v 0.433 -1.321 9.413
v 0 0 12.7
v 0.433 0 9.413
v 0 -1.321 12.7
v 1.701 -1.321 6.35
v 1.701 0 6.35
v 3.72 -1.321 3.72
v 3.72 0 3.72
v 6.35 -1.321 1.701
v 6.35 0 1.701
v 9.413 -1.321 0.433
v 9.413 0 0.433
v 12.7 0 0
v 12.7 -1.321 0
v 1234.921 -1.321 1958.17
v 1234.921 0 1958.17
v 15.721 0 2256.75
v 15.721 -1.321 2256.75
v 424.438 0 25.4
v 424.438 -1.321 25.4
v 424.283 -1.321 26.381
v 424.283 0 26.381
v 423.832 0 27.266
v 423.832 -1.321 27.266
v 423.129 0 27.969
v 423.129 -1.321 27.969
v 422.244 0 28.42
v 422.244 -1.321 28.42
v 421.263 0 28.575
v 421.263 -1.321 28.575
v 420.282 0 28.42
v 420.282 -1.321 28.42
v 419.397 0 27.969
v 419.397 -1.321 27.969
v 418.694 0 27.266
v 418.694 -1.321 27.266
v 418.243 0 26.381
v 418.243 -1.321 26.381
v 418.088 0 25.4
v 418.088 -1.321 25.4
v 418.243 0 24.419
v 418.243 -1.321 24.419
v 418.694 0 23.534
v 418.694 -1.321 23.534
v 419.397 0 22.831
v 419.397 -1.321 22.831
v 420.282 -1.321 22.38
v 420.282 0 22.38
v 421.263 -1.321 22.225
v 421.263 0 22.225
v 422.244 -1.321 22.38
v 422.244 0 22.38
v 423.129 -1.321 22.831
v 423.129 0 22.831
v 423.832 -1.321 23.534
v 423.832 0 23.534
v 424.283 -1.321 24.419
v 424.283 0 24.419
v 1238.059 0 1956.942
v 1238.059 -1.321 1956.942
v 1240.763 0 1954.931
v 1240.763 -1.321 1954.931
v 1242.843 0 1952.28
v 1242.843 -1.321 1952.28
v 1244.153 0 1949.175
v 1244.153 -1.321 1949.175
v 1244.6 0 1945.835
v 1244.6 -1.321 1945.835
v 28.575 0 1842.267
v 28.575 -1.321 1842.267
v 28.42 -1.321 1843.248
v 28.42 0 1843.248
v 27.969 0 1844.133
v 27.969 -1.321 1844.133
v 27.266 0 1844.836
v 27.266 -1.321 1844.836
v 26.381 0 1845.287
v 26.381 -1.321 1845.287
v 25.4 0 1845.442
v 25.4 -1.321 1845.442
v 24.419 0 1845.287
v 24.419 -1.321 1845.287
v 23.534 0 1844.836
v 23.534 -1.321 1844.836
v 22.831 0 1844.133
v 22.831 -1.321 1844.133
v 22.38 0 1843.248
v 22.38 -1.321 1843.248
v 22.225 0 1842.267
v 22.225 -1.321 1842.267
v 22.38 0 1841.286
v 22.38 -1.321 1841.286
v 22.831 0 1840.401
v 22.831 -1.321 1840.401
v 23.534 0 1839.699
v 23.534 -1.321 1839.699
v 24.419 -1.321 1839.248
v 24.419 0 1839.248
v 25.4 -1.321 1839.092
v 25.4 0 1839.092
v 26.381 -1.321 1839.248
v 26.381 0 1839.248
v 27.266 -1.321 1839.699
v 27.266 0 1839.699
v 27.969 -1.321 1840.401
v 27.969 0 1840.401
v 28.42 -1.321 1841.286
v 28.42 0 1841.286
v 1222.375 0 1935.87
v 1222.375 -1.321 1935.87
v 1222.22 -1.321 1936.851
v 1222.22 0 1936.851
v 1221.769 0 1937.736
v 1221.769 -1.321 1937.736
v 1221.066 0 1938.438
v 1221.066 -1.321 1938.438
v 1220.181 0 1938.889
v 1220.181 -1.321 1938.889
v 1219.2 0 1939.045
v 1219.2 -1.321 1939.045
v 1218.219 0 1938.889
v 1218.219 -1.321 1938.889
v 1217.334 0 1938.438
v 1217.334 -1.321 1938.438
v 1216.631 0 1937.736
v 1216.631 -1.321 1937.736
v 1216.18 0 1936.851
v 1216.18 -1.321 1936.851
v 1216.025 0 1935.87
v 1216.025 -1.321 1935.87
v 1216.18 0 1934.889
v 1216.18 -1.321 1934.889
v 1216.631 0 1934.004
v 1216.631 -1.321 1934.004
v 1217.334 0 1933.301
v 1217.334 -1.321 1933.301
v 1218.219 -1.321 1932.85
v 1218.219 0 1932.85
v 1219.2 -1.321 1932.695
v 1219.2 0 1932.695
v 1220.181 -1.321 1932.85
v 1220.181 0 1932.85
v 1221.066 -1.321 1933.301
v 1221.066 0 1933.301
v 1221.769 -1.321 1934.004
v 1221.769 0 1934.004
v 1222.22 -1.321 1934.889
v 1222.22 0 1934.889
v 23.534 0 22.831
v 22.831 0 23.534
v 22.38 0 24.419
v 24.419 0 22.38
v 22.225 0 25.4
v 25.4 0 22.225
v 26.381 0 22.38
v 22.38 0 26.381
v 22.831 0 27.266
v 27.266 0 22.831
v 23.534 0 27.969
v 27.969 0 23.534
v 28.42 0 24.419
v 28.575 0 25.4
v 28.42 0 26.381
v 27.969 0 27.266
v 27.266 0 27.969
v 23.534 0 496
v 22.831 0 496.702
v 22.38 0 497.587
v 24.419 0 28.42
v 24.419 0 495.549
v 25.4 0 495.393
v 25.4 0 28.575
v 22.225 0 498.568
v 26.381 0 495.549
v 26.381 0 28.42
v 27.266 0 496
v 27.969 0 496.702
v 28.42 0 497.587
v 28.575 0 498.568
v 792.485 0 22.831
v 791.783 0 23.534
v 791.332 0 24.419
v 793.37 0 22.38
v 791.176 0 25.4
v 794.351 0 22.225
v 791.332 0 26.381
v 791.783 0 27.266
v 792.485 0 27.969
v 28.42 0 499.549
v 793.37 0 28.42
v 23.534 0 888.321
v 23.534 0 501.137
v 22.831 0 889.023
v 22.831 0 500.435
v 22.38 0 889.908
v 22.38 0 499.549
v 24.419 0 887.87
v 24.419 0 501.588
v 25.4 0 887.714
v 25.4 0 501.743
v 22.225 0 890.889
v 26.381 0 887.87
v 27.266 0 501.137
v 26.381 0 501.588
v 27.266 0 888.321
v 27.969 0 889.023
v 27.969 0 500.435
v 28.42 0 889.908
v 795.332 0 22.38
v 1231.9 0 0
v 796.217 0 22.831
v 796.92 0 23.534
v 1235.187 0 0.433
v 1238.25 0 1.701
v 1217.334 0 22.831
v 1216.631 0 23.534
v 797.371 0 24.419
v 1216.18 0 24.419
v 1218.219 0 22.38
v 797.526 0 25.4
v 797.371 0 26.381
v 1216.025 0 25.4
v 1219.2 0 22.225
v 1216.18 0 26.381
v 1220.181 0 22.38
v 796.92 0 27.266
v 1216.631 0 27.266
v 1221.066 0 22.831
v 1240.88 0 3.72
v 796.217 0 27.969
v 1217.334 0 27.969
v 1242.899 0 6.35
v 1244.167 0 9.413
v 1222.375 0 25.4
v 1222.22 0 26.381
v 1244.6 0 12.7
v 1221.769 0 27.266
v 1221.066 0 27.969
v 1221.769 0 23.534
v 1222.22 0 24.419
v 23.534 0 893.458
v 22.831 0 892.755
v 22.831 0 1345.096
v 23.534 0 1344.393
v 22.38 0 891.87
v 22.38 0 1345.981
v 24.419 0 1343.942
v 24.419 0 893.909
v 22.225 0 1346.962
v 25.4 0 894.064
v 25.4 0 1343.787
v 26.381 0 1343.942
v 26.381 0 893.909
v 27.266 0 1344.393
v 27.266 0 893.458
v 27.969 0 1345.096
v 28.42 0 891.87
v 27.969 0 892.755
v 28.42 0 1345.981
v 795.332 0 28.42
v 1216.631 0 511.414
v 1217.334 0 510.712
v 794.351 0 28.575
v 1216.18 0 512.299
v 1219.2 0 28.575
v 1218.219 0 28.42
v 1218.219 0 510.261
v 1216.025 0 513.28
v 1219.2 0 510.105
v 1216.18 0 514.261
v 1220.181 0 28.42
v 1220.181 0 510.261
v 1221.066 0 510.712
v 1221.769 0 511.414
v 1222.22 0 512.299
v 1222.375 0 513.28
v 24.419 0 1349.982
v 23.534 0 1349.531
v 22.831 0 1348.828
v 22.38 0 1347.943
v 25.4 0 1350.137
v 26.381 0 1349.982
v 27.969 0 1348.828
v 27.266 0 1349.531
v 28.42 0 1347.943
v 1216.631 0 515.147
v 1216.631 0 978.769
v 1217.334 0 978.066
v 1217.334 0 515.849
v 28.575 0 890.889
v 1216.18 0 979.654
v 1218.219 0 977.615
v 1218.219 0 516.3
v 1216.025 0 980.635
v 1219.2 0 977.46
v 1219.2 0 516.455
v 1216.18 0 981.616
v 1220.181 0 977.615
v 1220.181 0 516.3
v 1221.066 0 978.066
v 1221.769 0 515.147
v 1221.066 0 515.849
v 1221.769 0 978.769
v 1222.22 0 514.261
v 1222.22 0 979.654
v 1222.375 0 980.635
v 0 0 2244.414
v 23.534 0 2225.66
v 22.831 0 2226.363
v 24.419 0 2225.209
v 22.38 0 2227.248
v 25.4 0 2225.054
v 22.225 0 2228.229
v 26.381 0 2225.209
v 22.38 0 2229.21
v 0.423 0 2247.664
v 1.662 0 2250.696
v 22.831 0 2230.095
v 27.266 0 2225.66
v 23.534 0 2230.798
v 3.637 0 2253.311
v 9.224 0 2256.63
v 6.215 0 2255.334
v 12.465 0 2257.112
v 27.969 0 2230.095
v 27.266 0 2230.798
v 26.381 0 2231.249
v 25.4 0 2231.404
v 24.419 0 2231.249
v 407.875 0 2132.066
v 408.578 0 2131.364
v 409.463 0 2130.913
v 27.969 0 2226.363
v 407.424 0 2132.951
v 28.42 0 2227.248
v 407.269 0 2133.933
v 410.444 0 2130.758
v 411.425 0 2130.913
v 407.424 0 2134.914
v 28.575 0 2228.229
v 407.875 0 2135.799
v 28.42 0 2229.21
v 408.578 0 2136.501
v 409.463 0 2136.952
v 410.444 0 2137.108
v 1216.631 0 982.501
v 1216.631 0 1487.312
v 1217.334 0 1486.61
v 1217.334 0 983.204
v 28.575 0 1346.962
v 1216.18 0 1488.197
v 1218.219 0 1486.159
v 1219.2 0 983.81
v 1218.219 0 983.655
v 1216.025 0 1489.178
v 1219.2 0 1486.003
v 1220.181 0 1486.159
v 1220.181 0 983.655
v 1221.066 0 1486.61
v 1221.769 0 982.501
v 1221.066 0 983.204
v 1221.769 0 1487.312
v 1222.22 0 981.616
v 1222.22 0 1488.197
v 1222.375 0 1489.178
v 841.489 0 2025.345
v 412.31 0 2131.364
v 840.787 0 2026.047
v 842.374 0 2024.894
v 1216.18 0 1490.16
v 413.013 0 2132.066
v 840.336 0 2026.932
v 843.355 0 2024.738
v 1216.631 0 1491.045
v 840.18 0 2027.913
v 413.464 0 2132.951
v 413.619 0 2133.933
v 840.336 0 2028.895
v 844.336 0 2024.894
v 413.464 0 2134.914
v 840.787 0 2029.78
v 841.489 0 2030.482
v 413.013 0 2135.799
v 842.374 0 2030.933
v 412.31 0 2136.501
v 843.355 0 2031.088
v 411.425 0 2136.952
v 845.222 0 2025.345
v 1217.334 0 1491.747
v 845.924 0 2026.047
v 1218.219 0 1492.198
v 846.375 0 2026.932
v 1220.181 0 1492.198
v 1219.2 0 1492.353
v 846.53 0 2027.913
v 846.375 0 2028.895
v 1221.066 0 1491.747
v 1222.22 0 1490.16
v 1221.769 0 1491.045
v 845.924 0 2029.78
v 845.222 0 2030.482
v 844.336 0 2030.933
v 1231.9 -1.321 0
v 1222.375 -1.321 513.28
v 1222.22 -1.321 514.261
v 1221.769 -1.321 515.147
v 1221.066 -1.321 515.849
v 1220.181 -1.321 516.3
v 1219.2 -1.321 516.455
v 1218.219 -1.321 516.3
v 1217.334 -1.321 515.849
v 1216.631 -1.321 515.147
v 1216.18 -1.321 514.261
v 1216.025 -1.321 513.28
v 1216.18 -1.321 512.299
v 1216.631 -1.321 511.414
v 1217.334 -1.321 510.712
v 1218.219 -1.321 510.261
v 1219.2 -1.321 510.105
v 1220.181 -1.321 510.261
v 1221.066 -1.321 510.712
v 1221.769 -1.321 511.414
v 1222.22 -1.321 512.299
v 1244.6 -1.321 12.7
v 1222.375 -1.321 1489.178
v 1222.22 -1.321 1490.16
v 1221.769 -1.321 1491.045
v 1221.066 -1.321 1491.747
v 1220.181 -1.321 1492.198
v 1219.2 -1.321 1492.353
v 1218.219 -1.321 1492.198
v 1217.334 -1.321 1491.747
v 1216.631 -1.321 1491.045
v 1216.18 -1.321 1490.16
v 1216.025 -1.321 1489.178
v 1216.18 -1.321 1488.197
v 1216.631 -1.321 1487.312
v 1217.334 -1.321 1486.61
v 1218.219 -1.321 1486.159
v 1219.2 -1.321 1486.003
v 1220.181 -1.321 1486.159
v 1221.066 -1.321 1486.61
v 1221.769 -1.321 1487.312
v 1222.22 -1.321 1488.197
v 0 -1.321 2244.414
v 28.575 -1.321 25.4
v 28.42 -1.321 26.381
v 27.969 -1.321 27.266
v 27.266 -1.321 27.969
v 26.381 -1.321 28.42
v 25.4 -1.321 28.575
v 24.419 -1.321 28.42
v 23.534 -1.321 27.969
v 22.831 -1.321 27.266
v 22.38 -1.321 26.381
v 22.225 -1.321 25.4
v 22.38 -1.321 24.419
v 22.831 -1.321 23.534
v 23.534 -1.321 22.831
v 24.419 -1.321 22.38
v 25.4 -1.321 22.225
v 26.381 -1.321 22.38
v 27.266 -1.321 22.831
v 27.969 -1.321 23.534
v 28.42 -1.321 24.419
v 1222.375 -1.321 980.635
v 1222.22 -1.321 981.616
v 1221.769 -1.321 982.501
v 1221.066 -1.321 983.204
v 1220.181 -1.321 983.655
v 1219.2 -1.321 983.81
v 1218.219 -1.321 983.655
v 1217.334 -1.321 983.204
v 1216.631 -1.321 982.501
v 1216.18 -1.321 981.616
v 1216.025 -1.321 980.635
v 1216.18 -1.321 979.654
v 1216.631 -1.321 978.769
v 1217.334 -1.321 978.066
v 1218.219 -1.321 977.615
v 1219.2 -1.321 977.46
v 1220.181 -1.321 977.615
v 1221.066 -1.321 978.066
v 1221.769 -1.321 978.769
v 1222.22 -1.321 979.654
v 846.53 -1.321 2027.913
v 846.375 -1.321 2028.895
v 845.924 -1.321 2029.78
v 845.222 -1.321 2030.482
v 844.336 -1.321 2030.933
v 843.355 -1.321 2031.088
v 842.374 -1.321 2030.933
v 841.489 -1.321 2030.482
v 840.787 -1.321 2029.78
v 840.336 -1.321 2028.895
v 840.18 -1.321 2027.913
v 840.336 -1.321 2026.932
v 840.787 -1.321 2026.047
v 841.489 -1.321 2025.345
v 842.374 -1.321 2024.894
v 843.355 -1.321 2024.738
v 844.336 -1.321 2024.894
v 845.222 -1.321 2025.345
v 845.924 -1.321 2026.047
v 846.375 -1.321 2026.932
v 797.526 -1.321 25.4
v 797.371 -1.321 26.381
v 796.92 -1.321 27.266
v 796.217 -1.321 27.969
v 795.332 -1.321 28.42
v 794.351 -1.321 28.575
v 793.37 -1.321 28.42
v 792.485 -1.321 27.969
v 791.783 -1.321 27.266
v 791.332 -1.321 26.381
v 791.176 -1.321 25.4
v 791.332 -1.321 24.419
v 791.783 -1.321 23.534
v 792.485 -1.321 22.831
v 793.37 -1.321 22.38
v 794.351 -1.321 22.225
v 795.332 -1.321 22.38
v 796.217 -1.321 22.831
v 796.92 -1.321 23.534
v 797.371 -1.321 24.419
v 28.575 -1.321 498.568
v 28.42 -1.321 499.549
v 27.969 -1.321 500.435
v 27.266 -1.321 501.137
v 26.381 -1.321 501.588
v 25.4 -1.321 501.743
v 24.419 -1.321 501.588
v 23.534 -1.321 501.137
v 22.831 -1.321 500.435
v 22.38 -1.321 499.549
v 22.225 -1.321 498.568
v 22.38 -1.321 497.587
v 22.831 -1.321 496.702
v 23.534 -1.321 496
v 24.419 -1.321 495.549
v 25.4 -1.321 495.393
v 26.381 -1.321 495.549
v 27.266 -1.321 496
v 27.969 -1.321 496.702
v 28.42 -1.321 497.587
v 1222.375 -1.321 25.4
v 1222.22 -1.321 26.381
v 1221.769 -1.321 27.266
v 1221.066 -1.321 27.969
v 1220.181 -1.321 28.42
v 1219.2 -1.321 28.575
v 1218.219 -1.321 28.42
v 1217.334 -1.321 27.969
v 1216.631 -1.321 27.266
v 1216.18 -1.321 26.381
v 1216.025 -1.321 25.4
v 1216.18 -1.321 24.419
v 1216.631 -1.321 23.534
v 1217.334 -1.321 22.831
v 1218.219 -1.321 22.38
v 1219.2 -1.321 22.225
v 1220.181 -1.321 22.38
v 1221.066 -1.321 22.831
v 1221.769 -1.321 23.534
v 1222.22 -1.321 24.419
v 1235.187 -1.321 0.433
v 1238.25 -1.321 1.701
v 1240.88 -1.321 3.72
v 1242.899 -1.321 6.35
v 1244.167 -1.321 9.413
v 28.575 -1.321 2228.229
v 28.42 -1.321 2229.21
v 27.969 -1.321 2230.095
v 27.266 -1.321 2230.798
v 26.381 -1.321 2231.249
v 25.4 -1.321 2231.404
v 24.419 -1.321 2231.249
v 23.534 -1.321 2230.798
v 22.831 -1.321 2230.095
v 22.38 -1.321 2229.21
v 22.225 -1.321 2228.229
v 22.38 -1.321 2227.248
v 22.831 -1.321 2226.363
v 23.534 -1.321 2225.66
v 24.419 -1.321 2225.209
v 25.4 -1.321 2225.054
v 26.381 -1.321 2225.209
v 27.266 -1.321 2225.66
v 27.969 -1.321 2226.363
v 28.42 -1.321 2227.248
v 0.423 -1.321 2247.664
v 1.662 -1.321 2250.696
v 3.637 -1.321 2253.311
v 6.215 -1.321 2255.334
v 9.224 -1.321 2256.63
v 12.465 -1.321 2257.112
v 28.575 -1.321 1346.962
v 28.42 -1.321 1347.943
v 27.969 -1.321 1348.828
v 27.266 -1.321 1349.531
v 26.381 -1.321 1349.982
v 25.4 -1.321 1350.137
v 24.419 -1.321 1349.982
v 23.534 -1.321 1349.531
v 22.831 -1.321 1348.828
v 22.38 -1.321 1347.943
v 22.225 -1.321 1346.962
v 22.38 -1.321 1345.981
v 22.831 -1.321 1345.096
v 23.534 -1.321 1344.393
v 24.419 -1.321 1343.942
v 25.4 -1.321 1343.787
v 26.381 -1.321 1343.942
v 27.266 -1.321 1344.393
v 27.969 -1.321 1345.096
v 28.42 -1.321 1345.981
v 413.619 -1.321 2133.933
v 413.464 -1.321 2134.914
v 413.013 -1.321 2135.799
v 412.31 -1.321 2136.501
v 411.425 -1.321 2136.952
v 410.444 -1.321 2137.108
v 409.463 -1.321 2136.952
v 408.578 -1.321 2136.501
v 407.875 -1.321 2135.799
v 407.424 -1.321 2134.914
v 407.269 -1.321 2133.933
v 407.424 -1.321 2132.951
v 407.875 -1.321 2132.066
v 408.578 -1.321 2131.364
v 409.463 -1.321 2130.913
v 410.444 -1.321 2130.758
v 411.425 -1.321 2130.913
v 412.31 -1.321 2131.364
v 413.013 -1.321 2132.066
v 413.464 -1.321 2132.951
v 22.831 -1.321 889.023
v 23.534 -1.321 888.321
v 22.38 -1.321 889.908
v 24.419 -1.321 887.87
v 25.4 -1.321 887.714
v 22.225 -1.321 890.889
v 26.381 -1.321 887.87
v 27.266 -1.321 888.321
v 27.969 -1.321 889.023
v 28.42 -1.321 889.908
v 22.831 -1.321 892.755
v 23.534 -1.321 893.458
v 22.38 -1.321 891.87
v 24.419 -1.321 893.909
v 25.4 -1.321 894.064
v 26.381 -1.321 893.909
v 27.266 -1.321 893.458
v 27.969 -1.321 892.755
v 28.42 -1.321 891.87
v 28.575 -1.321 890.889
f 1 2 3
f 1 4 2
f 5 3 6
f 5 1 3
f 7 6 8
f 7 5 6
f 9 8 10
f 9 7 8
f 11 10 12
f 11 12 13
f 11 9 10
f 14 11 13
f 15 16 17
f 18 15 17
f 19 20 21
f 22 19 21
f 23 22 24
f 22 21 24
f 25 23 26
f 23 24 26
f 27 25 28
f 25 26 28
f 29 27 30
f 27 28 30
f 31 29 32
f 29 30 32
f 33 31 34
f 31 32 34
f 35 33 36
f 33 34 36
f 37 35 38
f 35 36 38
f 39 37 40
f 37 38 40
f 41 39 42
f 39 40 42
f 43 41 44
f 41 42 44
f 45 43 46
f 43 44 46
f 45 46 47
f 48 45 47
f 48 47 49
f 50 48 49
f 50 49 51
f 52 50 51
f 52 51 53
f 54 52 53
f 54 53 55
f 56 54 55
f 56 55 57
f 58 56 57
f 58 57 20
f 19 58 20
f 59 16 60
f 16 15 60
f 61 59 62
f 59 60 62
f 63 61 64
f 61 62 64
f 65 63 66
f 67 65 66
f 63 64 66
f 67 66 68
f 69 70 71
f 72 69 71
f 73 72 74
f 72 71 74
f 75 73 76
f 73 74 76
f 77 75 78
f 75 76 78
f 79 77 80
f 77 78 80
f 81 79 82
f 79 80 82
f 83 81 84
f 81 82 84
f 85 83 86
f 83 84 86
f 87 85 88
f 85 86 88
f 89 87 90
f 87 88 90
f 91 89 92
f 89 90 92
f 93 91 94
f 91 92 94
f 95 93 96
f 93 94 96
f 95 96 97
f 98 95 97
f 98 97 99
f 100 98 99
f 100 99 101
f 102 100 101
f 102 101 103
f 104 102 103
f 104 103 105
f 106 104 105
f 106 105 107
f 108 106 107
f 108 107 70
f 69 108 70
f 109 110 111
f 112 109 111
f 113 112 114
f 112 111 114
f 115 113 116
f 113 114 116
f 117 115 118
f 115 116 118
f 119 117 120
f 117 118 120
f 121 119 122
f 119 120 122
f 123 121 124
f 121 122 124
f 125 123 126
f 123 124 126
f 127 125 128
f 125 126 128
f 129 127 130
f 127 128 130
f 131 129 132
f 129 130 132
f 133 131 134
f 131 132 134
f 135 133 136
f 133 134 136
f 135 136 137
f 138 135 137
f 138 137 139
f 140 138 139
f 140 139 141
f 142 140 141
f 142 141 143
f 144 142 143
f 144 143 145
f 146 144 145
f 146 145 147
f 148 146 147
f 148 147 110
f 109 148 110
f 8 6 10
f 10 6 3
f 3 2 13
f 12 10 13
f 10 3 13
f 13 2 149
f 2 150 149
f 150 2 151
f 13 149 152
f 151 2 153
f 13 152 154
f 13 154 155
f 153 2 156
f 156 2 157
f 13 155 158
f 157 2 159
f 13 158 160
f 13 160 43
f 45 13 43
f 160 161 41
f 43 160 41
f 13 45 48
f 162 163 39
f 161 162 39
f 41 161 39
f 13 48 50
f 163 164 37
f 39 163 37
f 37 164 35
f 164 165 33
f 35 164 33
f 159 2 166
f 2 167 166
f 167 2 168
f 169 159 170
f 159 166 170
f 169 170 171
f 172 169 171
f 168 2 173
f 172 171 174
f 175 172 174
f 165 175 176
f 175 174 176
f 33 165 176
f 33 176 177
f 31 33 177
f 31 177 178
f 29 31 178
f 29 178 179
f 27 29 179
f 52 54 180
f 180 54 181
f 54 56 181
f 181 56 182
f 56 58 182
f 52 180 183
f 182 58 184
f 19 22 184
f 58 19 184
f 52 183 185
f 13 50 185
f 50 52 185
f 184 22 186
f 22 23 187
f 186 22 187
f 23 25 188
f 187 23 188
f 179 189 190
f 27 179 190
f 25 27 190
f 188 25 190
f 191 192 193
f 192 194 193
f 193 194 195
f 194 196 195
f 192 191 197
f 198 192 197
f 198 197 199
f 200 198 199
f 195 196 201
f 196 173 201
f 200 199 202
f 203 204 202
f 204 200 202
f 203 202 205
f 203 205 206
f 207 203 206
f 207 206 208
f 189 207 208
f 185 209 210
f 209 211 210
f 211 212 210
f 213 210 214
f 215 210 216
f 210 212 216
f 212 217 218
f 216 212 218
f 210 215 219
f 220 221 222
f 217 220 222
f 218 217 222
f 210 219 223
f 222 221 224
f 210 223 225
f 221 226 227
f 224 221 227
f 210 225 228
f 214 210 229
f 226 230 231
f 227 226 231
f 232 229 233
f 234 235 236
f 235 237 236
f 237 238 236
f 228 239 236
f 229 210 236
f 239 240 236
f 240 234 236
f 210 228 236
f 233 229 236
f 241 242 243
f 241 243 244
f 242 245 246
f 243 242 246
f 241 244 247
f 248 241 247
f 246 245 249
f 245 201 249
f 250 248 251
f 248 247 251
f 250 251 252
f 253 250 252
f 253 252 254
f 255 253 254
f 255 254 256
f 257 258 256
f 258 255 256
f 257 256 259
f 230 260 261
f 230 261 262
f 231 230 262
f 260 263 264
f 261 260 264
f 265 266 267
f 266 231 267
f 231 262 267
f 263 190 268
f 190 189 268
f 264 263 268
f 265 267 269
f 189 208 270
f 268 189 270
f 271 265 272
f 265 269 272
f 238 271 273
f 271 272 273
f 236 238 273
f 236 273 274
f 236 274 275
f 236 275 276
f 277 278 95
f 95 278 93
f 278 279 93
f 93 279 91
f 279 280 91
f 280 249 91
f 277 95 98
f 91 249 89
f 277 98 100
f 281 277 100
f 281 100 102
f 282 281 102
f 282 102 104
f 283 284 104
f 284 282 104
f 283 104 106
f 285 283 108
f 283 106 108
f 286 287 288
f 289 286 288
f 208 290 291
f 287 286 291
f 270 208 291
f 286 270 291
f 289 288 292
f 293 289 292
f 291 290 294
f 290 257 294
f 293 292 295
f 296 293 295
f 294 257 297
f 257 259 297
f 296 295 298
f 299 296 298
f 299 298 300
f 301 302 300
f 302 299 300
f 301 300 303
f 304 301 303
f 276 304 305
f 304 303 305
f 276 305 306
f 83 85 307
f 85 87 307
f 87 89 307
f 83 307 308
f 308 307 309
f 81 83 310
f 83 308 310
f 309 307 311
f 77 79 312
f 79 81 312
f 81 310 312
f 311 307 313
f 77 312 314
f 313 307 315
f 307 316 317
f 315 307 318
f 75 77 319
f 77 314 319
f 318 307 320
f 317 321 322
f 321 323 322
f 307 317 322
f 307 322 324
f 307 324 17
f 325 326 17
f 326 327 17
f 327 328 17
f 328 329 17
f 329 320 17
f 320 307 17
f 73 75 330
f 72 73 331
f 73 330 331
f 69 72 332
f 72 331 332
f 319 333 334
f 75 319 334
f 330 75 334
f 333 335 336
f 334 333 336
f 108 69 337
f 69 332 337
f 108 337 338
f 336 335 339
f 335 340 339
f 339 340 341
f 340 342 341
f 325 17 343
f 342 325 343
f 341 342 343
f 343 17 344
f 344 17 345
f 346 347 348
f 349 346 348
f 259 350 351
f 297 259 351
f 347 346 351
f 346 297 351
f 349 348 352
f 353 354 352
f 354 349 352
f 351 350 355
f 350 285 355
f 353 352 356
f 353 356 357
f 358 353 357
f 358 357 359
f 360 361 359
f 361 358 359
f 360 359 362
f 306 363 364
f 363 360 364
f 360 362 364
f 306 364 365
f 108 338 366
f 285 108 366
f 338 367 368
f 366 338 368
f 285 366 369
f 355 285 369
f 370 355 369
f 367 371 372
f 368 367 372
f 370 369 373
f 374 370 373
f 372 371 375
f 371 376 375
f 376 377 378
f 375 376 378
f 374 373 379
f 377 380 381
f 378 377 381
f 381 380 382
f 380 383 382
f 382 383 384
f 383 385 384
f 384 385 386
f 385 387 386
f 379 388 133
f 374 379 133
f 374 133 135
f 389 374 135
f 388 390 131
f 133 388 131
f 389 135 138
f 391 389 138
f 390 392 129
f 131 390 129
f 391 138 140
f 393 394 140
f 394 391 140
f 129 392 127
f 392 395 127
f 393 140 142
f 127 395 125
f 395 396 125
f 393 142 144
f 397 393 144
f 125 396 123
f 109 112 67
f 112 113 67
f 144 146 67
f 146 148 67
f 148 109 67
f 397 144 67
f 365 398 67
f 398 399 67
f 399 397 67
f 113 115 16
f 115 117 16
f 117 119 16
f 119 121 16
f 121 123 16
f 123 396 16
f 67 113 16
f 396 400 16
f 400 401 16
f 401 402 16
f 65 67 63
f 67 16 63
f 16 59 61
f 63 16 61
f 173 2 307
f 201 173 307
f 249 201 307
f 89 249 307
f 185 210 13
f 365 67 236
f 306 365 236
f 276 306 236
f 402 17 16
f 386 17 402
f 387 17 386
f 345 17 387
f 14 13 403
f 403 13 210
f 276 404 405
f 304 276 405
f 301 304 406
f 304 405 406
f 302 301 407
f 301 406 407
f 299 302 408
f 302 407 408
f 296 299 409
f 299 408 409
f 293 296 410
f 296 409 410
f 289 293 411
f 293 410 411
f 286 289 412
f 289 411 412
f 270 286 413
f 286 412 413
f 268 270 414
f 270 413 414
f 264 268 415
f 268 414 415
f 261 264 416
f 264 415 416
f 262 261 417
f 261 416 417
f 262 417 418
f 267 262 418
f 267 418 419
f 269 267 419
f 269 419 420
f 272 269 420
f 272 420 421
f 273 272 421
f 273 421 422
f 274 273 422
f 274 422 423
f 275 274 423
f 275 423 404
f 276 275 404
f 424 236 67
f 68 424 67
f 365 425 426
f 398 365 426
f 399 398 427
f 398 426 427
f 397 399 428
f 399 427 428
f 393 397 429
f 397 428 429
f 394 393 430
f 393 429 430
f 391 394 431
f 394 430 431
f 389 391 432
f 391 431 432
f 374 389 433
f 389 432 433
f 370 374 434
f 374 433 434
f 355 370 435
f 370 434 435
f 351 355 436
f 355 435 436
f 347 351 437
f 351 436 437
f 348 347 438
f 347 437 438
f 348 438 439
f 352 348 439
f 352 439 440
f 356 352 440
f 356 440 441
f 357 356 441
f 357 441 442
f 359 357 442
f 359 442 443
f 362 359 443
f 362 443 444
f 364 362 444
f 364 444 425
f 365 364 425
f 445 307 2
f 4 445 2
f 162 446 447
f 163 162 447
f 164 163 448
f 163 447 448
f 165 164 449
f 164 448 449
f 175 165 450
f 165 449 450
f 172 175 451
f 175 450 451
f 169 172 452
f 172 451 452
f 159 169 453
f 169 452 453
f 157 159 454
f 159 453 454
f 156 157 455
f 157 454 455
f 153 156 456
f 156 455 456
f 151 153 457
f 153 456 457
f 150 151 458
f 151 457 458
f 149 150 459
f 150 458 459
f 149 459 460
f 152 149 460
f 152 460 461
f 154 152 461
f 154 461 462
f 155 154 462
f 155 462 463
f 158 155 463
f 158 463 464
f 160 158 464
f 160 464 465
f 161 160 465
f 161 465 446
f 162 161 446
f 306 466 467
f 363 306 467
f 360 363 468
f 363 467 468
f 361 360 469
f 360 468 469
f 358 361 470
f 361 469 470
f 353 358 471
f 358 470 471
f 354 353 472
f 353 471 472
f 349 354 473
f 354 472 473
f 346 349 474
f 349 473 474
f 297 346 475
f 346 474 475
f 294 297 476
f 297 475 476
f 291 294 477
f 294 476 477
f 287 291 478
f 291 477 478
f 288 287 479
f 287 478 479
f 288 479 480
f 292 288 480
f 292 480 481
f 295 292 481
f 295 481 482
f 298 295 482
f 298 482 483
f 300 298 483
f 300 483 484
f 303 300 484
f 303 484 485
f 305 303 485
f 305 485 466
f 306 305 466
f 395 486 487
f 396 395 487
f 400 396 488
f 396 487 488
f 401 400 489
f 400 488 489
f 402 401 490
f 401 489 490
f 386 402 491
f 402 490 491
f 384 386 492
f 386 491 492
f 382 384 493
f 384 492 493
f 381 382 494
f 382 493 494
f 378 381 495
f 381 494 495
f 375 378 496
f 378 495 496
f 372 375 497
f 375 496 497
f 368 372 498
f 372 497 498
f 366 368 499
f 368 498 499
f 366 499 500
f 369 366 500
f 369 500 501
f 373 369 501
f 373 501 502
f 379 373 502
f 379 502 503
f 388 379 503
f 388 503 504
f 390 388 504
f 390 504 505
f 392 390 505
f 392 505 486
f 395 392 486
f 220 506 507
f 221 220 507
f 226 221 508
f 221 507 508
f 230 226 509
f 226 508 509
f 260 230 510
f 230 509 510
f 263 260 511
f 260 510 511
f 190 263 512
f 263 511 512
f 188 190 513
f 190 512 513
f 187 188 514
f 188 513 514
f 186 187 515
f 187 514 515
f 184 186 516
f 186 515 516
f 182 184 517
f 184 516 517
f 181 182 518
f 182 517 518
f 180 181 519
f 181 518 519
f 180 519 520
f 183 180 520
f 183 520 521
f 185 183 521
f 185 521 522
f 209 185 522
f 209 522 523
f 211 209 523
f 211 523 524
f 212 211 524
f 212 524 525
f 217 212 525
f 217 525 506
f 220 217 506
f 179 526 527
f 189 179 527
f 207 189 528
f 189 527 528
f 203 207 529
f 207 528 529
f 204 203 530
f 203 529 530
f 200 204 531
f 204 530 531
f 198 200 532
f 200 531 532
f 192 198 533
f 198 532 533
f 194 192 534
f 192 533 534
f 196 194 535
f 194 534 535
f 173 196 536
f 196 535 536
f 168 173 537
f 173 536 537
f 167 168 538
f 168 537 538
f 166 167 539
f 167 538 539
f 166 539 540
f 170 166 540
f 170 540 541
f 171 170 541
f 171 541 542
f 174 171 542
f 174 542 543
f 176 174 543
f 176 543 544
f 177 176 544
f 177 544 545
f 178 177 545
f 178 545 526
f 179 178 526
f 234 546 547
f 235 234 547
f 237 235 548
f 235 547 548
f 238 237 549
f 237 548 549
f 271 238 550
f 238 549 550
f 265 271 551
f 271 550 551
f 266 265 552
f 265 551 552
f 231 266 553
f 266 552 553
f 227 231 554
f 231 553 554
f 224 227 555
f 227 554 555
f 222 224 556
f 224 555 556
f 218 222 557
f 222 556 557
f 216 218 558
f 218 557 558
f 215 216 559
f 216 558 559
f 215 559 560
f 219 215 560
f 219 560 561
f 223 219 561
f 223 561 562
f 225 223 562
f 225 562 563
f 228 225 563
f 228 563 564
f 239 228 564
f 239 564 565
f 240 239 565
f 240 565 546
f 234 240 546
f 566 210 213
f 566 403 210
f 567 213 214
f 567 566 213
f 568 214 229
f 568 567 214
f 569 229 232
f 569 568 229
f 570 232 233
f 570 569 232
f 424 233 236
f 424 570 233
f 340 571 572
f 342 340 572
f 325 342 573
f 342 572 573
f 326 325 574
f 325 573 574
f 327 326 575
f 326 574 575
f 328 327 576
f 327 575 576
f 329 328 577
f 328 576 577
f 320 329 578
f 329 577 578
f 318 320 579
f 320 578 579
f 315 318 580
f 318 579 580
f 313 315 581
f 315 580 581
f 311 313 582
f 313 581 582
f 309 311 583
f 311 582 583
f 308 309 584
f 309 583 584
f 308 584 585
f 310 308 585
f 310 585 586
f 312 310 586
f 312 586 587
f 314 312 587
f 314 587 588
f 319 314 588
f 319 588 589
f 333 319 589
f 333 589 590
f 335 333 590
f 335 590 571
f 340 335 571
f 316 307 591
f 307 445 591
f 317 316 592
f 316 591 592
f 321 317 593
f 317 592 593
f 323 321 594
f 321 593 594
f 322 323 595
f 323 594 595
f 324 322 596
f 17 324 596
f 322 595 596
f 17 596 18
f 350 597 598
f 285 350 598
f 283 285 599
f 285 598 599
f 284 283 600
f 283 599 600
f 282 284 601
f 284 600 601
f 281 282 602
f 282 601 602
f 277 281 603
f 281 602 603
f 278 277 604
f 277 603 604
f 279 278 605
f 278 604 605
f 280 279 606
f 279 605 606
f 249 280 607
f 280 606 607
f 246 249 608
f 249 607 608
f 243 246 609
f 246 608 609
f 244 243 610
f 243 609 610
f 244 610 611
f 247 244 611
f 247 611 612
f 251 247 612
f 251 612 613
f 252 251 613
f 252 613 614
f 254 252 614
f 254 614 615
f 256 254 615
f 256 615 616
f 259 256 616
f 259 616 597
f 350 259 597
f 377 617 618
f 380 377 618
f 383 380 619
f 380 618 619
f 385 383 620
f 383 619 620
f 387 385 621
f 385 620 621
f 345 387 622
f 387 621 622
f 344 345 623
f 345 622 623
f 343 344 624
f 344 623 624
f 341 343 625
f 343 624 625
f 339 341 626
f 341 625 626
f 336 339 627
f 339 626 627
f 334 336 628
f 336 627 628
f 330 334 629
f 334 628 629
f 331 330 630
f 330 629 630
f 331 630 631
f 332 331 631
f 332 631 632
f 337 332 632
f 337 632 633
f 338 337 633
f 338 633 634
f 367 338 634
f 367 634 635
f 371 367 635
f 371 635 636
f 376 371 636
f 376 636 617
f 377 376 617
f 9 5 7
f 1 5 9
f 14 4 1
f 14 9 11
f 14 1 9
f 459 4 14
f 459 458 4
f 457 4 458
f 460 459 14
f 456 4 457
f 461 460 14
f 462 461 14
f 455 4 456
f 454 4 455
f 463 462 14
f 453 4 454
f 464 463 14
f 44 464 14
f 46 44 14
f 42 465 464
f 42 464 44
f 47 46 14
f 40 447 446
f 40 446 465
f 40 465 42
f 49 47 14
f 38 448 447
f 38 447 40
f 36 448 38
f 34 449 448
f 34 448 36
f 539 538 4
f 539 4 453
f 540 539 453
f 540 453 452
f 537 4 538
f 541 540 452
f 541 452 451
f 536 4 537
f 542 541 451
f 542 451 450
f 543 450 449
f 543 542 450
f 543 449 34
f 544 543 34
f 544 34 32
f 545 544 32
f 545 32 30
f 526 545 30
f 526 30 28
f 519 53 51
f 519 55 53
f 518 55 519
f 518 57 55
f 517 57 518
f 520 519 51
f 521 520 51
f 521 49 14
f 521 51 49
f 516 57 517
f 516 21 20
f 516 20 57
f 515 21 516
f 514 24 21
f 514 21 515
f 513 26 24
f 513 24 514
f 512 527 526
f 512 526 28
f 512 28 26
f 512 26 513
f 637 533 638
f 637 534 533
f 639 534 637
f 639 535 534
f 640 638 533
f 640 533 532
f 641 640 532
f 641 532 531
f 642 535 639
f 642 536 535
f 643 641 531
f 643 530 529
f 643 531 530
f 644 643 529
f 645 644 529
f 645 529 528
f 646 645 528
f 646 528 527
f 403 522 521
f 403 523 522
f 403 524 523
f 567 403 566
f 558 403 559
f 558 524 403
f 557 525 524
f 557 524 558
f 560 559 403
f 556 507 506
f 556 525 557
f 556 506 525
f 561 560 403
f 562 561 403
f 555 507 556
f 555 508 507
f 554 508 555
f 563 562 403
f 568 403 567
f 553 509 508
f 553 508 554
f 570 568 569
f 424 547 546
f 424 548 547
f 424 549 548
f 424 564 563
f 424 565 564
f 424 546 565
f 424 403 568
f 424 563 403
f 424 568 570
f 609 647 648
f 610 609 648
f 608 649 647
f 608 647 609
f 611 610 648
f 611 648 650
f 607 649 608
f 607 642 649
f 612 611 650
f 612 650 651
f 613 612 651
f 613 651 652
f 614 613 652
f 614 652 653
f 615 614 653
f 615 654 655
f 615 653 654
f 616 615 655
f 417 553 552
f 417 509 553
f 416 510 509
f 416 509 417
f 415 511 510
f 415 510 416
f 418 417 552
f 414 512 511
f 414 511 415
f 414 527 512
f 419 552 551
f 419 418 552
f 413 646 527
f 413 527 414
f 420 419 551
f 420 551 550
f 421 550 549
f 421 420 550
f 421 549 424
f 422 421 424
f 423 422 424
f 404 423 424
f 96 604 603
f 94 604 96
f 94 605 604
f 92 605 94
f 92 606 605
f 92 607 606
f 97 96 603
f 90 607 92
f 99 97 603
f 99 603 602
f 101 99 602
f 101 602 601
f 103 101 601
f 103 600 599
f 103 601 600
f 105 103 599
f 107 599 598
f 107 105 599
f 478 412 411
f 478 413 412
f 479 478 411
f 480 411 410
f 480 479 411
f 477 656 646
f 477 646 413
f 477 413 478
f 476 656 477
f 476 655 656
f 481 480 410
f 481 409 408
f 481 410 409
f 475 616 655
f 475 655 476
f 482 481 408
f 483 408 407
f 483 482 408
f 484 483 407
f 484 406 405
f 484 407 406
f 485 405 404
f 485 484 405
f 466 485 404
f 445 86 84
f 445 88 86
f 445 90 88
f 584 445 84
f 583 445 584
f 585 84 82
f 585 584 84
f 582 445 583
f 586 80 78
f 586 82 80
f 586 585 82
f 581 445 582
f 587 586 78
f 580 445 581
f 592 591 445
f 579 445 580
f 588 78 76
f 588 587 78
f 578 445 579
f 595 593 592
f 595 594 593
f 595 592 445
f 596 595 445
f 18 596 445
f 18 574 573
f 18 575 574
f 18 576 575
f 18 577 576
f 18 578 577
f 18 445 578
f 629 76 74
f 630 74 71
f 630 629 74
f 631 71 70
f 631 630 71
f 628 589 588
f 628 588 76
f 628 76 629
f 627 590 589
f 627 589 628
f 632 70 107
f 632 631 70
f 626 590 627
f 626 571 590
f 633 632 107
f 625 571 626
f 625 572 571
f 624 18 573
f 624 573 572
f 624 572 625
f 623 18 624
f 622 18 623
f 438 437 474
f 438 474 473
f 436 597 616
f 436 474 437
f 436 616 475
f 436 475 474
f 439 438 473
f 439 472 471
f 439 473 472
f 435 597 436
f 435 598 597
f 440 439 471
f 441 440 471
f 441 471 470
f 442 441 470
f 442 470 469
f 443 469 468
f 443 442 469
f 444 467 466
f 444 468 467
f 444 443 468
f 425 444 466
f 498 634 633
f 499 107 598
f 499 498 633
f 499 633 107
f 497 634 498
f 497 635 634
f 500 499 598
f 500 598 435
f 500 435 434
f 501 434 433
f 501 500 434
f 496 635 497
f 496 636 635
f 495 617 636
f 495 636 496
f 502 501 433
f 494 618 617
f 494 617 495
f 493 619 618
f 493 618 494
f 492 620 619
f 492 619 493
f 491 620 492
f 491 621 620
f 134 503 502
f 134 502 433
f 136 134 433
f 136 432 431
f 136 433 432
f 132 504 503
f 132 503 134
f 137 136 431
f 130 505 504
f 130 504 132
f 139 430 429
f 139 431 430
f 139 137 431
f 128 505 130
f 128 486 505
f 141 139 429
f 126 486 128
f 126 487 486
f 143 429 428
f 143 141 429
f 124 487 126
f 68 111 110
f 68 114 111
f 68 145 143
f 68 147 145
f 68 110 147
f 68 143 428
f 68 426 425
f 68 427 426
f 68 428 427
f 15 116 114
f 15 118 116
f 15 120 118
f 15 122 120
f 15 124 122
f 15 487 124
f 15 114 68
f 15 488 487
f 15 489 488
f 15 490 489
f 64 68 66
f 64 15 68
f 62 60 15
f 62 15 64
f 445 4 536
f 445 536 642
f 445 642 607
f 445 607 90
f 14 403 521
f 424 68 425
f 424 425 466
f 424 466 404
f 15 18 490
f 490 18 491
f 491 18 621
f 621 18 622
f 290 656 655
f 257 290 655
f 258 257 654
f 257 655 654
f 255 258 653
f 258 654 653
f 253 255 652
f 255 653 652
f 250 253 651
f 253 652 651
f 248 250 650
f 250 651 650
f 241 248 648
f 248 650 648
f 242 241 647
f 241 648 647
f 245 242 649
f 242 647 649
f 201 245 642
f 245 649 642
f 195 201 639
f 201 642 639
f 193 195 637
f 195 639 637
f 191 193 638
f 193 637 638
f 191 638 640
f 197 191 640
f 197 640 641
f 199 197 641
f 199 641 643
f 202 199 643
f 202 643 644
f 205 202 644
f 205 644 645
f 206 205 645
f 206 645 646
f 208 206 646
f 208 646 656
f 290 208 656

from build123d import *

# Parameters (mm, degrees)
F1_DEPTH = 1.3208
F2_R     = 3.175
F3_DEPTH = 25.4
F4_R     = 12.7


with BuildPart() as f1:
    # F0 (on Front) → F1 (new body)
    with BuildSketch(Plane.XZ):
        Polygon((0, 2260.6), (0, 0), (1244.6, 0), (1244.6, 1955.8), align=None)
    extrude(amount=F1_DEPTH)

    # F2 (on face) → F3 (cut)
    with BuildSketch(Plane.XZ.offset(1.3208)):
        with Locations((25.4, 2228.229)):
            Circle(F2_R)
        with Locations((1219.2, 1935.869816)):
            Circle(F2_R)
        with Locations((410.443912, 2133.932531)):
            Circle(F2_R)
        with Locations((843.355338, 2027.913407)):
            Circle(F2_R)
        with Locations((1219.2, 25.4)):
            Circle(F2_R)
        with Locations((25.4, 25.4)):
            Circle(F2_R)
        with Locations((421.263099, 25.4)):
            Circle(F2_R)
        with Locations((794.35122, 25.4)):
            Circle(F2_R)
        with Locations((1219.2, 980.634908)):
            Circle(F2_R)
        with Locations((1219.2, 1489.178419)):
            Circle(F2_R)
        with Locations((1219.2, 513.280332)):
            Circle(F2_R)
        with Locations((25.4, 1346.962094)):
            Circle(F2_R)
        with Locations((25.4, 890.889168)):
            Circle(F2_R)
        with Locations((25.4, 498.568296)):
            Circle(F2_R)
        with Locations((25.4, 1842.267275)):
            Circle(F2_R)
    extrude(amount=-F3_DEPTH, mode=Mode.SUBTRACT)

    # F4
    f4_edges = [f1.edges().sort_by_distance(p)[0] for p in [
        (1244.6, -0.6604, 1955.8),
        (0, -0.6604, 2260.6),
        (1244.6, -0.6604, 0),
        (0, -0.6604, 0),
    ]]
    fillet(f4_edges, radius=F4_R)


solid = f1.part
